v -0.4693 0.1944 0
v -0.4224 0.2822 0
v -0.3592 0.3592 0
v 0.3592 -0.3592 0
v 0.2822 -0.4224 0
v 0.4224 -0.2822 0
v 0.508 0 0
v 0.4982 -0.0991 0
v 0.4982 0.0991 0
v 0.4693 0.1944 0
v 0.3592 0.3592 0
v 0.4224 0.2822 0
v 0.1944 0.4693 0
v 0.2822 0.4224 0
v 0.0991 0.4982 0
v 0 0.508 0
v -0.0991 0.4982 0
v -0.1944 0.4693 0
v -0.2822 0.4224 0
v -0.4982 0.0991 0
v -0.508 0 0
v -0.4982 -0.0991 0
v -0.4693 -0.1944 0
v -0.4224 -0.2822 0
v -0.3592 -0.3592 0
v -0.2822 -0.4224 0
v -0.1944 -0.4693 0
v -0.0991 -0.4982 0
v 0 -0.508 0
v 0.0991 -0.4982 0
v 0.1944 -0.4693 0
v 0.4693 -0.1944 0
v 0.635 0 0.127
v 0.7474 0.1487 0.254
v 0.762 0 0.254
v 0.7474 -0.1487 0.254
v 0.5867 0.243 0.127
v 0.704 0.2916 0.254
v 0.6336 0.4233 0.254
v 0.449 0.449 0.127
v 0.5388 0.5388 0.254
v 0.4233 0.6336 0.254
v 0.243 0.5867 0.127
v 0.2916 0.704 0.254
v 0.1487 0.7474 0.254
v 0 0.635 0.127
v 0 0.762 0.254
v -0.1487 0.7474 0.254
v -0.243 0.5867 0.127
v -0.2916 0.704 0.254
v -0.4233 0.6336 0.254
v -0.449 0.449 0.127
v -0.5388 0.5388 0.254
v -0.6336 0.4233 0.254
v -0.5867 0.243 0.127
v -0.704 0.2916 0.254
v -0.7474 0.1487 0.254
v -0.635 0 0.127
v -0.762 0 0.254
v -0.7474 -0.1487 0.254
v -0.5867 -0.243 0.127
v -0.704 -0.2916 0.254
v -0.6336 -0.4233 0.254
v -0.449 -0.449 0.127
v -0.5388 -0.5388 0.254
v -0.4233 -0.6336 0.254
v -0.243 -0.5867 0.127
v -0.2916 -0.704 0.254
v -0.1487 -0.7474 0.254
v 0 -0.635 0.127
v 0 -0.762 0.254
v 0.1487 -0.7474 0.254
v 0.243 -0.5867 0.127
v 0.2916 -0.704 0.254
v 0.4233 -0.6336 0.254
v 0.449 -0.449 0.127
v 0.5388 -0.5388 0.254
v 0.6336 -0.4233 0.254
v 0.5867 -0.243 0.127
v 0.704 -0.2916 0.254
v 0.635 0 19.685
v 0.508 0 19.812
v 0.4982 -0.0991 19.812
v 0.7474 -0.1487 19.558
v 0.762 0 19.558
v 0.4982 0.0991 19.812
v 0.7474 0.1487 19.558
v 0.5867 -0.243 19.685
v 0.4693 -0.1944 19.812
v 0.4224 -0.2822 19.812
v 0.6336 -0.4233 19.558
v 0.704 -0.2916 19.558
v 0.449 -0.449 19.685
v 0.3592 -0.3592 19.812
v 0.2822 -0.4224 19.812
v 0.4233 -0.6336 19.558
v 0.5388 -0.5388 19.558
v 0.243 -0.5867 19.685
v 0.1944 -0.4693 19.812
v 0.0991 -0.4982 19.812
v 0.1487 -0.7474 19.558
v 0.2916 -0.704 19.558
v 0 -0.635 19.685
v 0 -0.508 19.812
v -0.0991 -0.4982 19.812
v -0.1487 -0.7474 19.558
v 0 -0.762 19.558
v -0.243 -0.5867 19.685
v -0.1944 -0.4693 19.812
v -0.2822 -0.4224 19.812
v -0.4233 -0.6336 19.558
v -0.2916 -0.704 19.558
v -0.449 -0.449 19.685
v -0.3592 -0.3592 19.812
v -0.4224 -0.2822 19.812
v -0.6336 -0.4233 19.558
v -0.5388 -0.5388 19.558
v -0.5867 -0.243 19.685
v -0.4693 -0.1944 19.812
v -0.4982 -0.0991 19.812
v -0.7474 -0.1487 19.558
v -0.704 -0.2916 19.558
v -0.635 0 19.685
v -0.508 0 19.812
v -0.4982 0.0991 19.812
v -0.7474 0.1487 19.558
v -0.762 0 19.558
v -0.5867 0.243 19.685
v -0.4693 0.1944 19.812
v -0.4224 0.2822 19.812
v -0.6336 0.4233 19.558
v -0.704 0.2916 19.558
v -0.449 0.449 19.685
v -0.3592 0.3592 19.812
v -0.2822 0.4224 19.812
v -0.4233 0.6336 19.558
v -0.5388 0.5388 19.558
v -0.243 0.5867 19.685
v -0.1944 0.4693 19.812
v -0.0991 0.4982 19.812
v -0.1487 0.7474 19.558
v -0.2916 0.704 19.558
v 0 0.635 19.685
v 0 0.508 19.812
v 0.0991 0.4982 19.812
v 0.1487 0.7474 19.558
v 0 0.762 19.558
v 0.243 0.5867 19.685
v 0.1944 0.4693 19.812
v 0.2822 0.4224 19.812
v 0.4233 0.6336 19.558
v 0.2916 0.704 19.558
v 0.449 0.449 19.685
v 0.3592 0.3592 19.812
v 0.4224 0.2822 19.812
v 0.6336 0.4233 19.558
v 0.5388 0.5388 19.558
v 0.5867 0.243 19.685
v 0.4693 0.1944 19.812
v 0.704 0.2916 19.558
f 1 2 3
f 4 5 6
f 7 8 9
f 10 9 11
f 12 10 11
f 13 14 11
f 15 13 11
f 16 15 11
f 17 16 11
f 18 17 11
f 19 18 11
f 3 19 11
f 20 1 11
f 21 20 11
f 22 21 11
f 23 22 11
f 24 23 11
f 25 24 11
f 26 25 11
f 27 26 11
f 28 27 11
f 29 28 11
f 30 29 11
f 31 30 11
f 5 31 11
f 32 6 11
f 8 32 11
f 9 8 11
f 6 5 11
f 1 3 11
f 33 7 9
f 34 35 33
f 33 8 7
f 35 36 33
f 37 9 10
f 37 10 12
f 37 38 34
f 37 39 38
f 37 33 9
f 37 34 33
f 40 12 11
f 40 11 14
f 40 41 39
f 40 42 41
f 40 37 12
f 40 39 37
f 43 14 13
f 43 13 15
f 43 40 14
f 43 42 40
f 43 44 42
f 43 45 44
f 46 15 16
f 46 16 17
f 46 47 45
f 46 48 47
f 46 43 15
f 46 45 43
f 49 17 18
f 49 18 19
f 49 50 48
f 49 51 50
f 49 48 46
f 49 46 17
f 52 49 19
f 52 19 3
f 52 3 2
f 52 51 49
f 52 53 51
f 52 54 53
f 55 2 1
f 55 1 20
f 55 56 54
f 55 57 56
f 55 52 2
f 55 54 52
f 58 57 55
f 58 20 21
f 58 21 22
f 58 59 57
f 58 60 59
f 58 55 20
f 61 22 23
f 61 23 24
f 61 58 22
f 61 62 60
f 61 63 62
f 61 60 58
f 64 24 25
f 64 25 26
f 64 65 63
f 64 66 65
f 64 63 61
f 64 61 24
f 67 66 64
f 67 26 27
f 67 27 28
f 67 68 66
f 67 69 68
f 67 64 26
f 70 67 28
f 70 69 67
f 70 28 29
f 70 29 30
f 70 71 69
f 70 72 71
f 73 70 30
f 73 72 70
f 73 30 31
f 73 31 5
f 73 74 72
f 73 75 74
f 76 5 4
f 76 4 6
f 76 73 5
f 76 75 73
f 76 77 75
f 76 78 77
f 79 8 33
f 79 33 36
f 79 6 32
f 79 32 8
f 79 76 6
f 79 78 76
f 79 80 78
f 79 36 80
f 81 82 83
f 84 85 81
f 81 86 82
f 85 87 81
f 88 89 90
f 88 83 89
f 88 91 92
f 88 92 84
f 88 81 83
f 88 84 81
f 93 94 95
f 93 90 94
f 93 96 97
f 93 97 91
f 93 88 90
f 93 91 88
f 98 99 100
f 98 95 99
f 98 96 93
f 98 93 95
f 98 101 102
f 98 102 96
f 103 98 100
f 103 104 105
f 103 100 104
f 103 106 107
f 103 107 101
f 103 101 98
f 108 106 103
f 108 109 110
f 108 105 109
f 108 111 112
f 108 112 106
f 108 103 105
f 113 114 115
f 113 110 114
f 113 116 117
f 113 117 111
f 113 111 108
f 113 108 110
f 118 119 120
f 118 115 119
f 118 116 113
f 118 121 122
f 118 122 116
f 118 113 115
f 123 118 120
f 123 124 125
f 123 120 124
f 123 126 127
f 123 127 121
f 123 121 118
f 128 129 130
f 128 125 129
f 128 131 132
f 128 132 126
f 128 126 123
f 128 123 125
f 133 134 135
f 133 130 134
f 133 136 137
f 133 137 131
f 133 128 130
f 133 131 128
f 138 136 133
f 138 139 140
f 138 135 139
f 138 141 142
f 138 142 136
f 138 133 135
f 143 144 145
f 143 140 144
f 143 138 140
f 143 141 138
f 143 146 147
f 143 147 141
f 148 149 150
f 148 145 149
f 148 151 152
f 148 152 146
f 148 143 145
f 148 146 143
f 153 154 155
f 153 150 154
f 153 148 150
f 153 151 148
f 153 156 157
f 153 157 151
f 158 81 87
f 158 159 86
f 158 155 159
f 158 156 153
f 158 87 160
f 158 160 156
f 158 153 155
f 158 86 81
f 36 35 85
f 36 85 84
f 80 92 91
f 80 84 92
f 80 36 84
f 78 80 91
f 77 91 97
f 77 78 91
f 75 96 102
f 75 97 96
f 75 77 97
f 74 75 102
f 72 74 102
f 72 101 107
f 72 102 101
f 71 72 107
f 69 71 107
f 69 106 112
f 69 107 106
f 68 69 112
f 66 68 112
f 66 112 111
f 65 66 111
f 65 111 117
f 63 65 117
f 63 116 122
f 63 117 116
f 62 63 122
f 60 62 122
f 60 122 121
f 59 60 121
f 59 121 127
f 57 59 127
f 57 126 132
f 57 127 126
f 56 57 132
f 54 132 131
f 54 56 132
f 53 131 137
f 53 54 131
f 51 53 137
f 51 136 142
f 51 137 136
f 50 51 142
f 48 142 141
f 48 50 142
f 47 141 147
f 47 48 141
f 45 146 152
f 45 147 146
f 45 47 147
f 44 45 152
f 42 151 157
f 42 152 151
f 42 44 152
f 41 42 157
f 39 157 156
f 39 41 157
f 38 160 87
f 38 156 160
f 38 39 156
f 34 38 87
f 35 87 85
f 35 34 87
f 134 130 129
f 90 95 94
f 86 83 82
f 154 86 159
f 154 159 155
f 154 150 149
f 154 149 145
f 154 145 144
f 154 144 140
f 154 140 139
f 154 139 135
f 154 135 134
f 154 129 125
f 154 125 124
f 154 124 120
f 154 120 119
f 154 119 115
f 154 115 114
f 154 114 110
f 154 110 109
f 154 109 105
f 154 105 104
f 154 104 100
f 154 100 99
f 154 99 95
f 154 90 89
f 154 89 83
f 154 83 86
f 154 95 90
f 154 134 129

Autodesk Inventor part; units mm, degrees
ref_plane "YZ Plane" through (0, 0, 0) normal (1, 0, 0) x (0, 1, 0)
ref_plane "XZ Plane" through (0, 0, 0) normal (0, 1, 0) x (-1, 0, 0)
ref_plane "XY Plane" through (0, 0, 0) normal (0, 0, 1) x (1, 0, 0)
sketch "Sketch1" plane through (0, 0, 0) normal (0, 0, 1) x (1, 0, 0)
  circle A0 centre (0, 0) radius 0.762
  dimension "d0" = 1.524
extrude "Extrusion1" add sketch "Sketch1" along normal blind 19.812
chamfer "Chamfer1" distance 0.254 distance2 0.254 1 edges at (-0.762, 0, 19.812) measured on face at (0.4109, -0.2521, 19.812)
chamfer "Chamfer2" distance 0.254 distance2 0.254 1 edges at (-0.762, 0, 0) measured on face at (0.7595, -0.0613, 13.0387)
properties part number "Main axel" material "Stainless Steel"
